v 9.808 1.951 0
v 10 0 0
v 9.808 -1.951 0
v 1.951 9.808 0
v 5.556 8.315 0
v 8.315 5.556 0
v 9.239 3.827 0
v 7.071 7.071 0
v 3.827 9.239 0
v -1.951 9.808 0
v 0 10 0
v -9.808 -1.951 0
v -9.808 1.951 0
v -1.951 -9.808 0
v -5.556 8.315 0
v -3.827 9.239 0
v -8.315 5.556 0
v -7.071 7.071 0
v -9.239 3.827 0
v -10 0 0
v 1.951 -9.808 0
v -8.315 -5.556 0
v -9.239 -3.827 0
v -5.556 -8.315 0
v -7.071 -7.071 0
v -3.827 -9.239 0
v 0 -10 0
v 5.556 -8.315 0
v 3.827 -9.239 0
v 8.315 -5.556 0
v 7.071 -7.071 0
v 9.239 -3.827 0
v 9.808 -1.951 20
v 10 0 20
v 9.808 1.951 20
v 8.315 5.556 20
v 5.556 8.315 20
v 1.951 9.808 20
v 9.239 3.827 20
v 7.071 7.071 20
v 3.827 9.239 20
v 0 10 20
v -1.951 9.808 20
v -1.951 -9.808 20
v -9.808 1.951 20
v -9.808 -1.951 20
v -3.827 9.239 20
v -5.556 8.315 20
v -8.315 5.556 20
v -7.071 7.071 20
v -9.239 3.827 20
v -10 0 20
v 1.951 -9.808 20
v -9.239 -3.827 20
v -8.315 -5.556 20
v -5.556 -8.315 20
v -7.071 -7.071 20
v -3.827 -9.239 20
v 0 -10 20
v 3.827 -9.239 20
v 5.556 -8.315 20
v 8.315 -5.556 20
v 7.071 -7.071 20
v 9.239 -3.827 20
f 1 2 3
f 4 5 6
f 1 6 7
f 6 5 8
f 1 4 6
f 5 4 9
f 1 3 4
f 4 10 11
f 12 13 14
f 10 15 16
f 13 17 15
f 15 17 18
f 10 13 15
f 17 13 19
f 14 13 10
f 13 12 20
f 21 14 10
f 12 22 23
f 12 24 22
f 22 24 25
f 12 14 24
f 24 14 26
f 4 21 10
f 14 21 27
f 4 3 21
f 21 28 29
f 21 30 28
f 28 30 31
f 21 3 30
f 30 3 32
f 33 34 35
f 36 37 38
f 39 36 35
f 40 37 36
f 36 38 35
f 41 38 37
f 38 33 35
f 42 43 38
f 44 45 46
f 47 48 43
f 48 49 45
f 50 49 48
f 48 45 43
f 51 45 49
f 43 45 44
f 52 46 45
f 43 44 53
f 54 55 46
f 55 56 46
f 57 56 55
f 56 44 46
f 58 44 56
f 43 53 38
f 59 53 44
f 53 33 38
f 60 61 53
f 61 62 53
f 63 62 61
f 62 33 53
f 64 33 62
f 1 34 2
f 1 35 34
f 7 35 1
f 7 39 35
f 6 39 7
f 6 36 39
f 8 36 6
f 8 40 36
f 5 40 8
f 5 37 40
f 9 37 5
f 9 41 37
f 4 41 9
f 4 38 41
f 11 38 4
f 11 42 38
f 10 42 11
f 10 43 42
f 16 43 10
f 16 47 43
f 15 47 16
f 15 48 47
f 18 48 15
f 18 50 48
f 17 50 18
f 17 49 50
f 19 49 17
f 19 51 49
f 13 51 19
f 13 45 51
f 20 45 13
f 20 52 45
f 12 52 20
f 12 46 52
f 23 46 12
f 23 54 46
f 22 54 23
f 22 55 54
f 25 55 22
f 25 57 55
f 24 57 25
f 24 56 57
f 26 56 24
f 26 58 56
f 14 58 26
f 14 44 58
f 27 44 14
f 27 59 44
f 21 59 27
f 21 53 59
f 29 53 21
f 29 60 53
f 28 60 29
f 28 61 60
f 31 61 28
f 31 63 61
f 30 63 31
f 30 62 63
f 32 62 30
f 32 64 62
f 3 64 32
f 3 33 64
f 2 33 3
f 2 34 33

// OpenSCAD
// A cylinder nobody had to declare: linear_extrude of a circle.
//
// The mesh is a ring of 32 quads, which is equally the mesh of a 32 sided prism.
// Nothing measurable tells them apart - that is the ambiguity the declaration
// channel exists for, and step-declare.scad is the same body with the statement
// made by hand. Here the circle makes it itself: it records its radius as an
// Arc2d on the profile, and the extrusion turns that into the cylinder it swept.
//
// The refusals are the interesting half, and each has its own fixture beside
// this one: a twist or an uneven scale sweeps a helicoid or a general ruled
// surface, an oblique v sweeps an oblique cylinder whose circular section is not
// perpendicular to its axis, and a sheared profile plane has no circle in it to
// begin with. None of those is a CYLINDRICAL_SURFACE and none is declared.
//
// EXPECT: 1 analytic surface available (1 cylindrical, 0 spherical, 0 toroidal, 0 Bezier)
// EXPECT: 1 surface recognised (0 toroidal, 0 spherical, 0 conical, 0 partial), 32 facets replaced
//
// pi*10^2*20. The analytic export is the true cylinder rather than the 32-gon
// prism the mesh is, so this is the exact figure and not the polygon's
// 6238.7 - which is the whole claim the fixture makes.
// ROUNDTRIP: Cylinder=1 Plane=2
// VOLUME: 6283.1853072
$fn = 32;
linear_extrude(height = 20) circle(r = 10);
